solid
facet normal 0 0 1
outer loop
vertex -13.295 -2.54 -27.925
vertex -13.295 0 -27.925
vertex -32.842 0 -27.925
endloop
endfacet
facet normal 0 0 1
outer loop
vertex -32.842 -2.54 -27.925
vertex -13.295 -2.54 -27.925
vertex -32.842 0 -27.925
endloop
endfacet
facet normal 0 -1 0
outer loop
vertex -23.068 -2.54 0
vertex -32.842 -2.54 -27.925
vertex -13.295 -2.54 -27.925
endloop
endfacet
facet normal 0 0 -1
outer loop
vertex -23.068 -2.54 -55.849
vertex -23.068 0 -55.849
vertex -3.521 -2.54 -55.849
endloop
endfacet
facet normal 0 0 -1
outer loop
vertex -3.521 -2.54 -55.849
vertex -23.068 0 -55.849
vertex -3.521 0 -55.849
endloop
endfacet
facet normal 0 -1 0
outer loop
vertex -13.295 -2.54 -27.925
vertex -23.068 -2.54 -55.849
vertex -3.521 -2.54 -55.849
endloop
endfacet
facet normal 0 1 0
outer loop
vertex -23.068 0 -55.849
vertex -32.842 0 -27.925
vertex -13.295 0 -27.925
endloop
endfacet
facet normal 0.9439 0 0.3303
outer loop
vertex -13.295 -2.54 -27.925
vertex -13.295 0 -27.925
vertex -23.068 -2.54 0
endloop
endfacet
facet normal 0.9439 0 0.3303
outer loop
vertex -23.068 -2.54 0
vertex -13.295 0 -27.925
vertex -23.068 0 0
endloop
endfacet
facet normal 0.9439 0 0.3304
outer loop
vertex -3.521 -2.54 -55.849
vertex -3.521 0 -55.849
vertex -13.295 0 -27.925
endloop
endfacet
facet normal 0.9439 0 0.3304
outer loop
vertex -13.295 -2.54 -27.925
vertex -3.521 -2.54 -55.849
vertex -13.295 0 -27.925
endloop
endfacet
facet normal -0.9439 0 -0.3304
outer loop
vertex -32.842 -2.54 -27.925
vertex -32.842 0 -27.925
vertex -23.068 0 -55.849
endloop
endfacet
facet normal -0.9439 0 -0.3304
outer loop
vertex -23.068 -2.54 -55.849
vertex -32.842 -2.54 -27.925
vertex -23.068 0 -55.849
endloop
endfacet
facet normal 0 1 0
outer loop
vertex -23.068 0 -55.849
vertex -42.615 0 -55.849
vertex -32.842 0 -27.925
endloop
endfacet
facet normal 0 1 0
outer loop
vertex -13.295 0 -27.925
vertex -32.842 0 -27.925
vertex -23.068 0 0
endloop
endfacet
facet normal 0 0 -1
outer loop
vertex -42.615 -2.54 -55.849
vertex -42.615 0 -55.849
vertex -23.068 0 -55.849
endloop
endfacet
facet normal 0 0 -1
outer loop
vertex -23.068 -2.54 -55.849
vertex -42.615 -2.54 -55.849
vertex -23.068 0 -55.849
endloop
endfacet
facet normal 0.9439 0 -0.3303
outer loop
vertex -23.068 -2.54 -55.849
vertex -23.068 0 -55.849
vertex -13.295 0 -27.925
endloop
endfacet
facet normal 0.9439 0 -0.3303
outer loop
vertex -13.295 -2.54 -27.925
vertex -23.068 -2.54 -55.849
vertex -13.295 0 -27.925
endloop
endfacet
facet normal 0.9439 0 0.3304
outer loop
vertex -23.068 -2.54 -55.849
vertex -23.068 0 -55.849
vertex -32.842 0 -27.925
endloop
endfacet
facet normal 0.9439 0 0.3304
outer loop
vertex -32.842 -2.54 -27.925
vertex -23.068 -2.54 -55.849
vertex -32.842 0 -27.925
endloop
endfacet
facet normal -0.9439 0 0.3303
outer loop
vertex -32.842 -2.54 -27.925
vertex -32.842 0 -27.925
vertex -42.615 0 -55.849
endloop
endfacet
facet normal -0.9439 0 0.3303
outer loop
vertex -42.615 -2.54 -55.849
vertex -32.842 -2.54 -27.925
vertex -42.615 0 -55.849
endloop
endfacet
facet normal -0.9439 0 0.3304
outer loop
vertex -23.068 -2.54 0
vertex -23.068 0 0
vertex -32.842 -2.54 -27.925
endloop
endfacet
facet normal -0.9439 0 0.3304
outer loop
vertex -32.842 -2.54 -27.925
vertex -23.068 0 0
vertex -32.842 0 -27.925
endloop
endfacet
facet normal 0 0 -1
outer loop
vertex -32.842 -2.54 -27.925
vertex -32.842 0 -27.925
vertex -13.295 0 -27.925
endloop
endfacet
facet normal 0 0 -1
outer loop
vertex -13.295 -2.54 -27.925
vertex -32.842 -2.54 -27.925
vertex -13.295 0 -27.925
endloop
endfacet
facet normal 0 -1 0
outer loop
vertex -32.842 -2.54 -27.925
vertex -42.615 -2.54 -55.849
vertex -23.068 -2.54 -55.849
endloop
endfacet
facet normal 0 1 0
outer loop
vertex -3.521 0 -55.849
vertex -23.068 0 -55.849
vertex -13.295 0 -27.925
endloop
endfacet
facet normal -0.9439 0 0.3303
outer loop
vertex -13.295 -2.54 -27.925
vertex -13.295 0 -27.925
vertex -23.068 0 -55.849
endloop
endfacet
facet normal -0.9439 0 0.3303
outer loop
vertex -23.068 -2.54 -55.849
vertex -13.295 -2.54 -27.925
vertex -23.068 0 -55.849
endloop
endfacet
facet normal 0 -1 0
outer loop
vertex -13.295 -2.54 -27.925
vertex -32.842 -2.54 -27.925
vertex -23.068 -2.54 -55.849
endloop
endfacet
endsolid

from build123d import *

# Parameters (mm, degrees)
F1_DEPTH = 2.54
F2_DEPTH = 2.54


with BuildPart() as f1:
    # F0 (on Front) → F1 (new body)
    with BuildSketch(Plane.XZ):
        Polygon((-23.068134, 0), (-32.841739, -27.924582), (-13.29453, -27.924582), align=None)
        Polygon((-32.841739, -27.924582), (-42.615343, -55.849165), (-23.068134, -55.849165), align=None)
        Polygon((-13.29453, -27.924582), (-23.068134, -55.849165), (-3.520926, -55.849165), align=None)
    extrude(amount=F1_DEPTH)


with BuildPart() as f2:
    # F0 (on Front) → F2 (new body)
    with BuildSketch(Plane.XZ):
        Polygon((-32.841739, -27.924582), (-23.068134, -55.849165), (-13.29453, -27.924582), align=None)
    extrude(amount=F2_DEPTH)


solid = Compound([f1.part, f2.part])
